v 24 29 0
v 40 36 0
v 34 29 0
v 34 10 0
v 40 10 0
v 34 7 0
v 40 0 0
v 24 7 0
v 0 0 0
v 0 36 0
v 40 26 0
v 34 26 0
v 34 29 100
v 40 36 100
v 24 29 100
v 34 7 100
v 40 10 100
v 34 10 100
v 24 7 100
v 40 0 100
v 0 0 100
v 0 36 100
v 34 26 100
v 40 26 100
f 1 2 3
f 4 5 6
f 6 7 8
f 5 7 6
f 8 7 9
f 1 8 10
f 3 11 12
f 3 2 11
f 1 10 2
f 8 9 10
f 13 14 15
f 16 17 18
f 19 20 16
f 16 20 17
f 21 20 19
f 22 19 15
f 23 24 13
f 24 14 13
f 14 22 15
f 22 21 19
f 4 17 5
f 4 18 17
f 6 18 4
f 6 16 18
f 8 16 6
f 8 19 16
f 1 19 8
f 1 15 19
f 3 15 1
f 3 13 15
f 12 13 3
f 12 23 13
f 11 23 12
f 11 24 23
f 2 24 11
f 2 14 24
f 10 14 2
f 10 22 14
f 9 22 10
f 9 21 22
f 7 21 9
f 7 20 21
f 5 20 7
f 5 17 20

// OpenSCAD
$fn = 32;

// ----------------------------------------------------------------------
// T-slot rail: 40 x 36 mm section, 100 mm long
// ----------------------------------------------------------------------

// --- parameters (mm) ---
profile_height = 100;     // extrusion height
profile_points = 12;      // points of the closed outline

profile = [[0, 0], [40, 0], [40, 10], [34, 10], [34, 7], [24, 7], [24, 29], [34, 29], [34, 26], [40, 26], [40, 36], [0, 36]];  // single closed polygon, 12 points, counter clockwise

// --- the one profile operation ---
linear_extrude(height = profile_height) polygon(points = profile);
